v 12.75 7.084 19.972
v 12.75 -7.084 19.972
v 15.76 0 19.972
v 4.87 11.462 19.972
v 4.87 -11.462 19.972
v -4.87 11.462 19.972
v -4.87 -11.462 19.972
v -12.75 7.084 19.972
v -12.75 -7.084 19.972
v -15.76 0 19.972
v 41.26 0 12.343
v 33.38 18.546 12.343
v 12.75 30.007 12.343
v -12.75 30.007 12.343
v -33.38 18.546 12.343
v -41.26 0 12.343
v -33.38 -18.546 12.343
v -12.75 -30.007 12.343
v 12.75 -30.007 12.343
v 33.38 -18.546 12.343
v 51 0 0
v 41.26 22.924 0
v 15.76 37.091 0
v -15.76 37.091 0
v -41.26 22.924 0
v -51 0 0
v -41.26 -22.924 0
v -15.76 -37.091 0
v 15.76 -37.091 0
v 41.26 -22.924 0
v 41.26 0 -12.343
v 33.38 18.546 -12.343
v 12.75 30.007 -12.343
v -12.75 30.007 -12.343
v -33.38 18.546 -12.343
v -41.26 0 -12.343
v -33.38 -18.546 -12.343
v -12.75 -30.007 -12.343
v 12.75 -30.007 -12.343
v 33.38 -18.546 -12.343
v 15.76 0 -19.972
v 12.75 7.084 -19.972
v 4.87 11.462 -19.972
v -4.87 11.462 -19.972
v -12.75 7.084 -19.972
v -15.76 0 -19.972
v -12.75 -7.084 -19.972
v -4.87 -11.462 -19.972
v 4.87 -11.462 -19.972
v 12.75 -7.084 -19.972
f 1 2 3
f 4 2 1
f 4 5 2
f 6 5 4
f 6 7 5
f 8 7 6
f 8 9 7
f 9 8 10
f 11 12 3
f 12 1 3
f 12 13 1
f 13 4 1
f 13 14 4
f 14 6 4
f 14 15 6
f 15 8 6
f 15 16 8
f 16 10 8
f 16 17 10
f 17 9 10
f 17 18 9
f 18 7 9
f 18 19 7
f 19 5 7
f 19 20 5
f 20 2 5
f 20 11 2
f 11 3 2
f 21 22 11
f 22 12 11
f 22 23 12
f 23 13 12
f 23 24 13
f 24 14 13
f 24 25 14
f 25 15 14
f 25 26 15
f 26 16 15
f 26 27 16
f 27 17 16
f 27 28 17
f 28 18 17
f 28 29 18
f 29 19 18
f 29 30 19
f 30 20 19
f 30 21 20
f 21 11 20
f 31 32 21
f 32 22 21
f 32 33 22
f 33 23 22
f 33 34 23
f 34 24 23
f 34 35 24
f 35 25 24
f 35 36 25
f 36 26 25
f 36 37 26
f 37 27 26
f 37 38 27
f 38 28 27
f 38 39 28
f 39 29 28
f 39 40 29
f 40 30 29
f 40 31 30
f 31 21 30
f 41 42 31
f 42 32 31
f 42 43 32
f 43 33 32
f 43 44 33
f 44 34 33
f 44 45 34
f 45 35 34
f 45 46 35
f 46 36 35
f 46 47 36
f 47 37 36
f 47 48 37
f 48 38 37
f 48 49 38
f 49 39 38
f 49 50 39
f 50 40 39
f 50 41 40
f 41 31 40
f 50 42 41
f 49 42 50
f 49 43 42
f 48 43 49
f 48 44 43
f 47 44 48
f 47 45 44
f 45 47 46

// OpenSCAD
// Generated by SolidPython 1.0.1 on 2020-07-29 00:46:53


scale(v = [17, 13, 7]) {
	sphere(r = 3);
}
/***********************************************
*********      SolidPython code:      **********
************************************************
 
# import packages: SolidPython
from solid import *
from solid.utils import *
from itertools import chain, combinations, permutations


class Resize:

    def __init__(self, scad_file):
        self.scad_file = scad_file
        #self.scad_file = import_scad(scad_file)
        # cone/cylinder param:
        self.r1 = 0
        self.r2 = 0
        self.h = 0
        # rectangular prism param:
        self.w = 0
        self.l = 0
        # ellipse param:
        self.r = 0

    # import OpenScad code (file name corresponds to shape)


    # classify shape + parameters
    def assign(self, param1, param2, param3):
        if self.scad_file == 'cone.scad':
            self.r1 = param1
            self.r2 = param2
            self.h = param3
        elif self.scad_file == 'cylinder.scad':
            self.r1 = param1
            self.r2 = param2
            self.h = param3
        elif self.scad_file == 'rectangularPrism.scad':
            self.h = param1
            self.l = param2
            self.w = param3
        else:
            self.r = param1
            self.h = param2

    # resize parameters
    def iterate(self):
        x = range(3, 20, 2)
        i = 1
        if self.scad_file == 'cone.scad':
            tempList = list(permutations(x, 2))
            for temp in tempList:
                param1 = temp[0]
                param2 = temp[1]
                filepath = 'produced_scad_files/' + 'cone' + str(param1) + '_' + str(param2) + '_' + '.scad'
                scad_render_to_file(cylinder(h=param1, r1=param2, r2=0), filepath)

        elif self.scad_file == 'cylinder.scad':
            tempList = list(permutations(x, 3))
            for temp in tempList:
                param1 = temp[0]
                param2 = temp[1]
                filepath = 'produced_scad_files/' + 'cylinder' + str(param1) + '_' + str(param2) + '_' + '.scad'
                scad_render_to_file(cylinder(h=param1, r1=param2, r2=param2), filepath)

        elif self.scad_file == 'rectangularPrism.scad':
            tempList = list(permutations(x, 3))
            for temp in tempList:
                param1 = temp[0]
                param2 = temp[1]
                param3 = temp[2]
                filepath = 'produced_scad_files/' + 'rectangularPrism' + str(param1) + '_' + str(param2) + '_' + str(
                    param3) + '.scad'
                scad_render_to_file(cube(size=(param1, param2, param3)), filepath)

        elif self.scad_file == 'ellipse.scad':
            tempList = list(permutations(x, 4))
            for temp in tempList:
                param1 = temp[0]
                param2 = temp[1]
                param3 = temp[2]
                param4 = temp[3]
                filepath = 'produced_scad_files/' + 'ellipse' + str(param1) + '_' + str(param2) + '_' + str(param3) + '_' + str(param4) + '.scad'
                scad_render_to_file(scale([param1, param2, param3])(sphere(r=param4)), filepath)

    def render_to_scadfile(self):
        scad_render_to_file(scad, 'example.scad') 
 
************************************************/
